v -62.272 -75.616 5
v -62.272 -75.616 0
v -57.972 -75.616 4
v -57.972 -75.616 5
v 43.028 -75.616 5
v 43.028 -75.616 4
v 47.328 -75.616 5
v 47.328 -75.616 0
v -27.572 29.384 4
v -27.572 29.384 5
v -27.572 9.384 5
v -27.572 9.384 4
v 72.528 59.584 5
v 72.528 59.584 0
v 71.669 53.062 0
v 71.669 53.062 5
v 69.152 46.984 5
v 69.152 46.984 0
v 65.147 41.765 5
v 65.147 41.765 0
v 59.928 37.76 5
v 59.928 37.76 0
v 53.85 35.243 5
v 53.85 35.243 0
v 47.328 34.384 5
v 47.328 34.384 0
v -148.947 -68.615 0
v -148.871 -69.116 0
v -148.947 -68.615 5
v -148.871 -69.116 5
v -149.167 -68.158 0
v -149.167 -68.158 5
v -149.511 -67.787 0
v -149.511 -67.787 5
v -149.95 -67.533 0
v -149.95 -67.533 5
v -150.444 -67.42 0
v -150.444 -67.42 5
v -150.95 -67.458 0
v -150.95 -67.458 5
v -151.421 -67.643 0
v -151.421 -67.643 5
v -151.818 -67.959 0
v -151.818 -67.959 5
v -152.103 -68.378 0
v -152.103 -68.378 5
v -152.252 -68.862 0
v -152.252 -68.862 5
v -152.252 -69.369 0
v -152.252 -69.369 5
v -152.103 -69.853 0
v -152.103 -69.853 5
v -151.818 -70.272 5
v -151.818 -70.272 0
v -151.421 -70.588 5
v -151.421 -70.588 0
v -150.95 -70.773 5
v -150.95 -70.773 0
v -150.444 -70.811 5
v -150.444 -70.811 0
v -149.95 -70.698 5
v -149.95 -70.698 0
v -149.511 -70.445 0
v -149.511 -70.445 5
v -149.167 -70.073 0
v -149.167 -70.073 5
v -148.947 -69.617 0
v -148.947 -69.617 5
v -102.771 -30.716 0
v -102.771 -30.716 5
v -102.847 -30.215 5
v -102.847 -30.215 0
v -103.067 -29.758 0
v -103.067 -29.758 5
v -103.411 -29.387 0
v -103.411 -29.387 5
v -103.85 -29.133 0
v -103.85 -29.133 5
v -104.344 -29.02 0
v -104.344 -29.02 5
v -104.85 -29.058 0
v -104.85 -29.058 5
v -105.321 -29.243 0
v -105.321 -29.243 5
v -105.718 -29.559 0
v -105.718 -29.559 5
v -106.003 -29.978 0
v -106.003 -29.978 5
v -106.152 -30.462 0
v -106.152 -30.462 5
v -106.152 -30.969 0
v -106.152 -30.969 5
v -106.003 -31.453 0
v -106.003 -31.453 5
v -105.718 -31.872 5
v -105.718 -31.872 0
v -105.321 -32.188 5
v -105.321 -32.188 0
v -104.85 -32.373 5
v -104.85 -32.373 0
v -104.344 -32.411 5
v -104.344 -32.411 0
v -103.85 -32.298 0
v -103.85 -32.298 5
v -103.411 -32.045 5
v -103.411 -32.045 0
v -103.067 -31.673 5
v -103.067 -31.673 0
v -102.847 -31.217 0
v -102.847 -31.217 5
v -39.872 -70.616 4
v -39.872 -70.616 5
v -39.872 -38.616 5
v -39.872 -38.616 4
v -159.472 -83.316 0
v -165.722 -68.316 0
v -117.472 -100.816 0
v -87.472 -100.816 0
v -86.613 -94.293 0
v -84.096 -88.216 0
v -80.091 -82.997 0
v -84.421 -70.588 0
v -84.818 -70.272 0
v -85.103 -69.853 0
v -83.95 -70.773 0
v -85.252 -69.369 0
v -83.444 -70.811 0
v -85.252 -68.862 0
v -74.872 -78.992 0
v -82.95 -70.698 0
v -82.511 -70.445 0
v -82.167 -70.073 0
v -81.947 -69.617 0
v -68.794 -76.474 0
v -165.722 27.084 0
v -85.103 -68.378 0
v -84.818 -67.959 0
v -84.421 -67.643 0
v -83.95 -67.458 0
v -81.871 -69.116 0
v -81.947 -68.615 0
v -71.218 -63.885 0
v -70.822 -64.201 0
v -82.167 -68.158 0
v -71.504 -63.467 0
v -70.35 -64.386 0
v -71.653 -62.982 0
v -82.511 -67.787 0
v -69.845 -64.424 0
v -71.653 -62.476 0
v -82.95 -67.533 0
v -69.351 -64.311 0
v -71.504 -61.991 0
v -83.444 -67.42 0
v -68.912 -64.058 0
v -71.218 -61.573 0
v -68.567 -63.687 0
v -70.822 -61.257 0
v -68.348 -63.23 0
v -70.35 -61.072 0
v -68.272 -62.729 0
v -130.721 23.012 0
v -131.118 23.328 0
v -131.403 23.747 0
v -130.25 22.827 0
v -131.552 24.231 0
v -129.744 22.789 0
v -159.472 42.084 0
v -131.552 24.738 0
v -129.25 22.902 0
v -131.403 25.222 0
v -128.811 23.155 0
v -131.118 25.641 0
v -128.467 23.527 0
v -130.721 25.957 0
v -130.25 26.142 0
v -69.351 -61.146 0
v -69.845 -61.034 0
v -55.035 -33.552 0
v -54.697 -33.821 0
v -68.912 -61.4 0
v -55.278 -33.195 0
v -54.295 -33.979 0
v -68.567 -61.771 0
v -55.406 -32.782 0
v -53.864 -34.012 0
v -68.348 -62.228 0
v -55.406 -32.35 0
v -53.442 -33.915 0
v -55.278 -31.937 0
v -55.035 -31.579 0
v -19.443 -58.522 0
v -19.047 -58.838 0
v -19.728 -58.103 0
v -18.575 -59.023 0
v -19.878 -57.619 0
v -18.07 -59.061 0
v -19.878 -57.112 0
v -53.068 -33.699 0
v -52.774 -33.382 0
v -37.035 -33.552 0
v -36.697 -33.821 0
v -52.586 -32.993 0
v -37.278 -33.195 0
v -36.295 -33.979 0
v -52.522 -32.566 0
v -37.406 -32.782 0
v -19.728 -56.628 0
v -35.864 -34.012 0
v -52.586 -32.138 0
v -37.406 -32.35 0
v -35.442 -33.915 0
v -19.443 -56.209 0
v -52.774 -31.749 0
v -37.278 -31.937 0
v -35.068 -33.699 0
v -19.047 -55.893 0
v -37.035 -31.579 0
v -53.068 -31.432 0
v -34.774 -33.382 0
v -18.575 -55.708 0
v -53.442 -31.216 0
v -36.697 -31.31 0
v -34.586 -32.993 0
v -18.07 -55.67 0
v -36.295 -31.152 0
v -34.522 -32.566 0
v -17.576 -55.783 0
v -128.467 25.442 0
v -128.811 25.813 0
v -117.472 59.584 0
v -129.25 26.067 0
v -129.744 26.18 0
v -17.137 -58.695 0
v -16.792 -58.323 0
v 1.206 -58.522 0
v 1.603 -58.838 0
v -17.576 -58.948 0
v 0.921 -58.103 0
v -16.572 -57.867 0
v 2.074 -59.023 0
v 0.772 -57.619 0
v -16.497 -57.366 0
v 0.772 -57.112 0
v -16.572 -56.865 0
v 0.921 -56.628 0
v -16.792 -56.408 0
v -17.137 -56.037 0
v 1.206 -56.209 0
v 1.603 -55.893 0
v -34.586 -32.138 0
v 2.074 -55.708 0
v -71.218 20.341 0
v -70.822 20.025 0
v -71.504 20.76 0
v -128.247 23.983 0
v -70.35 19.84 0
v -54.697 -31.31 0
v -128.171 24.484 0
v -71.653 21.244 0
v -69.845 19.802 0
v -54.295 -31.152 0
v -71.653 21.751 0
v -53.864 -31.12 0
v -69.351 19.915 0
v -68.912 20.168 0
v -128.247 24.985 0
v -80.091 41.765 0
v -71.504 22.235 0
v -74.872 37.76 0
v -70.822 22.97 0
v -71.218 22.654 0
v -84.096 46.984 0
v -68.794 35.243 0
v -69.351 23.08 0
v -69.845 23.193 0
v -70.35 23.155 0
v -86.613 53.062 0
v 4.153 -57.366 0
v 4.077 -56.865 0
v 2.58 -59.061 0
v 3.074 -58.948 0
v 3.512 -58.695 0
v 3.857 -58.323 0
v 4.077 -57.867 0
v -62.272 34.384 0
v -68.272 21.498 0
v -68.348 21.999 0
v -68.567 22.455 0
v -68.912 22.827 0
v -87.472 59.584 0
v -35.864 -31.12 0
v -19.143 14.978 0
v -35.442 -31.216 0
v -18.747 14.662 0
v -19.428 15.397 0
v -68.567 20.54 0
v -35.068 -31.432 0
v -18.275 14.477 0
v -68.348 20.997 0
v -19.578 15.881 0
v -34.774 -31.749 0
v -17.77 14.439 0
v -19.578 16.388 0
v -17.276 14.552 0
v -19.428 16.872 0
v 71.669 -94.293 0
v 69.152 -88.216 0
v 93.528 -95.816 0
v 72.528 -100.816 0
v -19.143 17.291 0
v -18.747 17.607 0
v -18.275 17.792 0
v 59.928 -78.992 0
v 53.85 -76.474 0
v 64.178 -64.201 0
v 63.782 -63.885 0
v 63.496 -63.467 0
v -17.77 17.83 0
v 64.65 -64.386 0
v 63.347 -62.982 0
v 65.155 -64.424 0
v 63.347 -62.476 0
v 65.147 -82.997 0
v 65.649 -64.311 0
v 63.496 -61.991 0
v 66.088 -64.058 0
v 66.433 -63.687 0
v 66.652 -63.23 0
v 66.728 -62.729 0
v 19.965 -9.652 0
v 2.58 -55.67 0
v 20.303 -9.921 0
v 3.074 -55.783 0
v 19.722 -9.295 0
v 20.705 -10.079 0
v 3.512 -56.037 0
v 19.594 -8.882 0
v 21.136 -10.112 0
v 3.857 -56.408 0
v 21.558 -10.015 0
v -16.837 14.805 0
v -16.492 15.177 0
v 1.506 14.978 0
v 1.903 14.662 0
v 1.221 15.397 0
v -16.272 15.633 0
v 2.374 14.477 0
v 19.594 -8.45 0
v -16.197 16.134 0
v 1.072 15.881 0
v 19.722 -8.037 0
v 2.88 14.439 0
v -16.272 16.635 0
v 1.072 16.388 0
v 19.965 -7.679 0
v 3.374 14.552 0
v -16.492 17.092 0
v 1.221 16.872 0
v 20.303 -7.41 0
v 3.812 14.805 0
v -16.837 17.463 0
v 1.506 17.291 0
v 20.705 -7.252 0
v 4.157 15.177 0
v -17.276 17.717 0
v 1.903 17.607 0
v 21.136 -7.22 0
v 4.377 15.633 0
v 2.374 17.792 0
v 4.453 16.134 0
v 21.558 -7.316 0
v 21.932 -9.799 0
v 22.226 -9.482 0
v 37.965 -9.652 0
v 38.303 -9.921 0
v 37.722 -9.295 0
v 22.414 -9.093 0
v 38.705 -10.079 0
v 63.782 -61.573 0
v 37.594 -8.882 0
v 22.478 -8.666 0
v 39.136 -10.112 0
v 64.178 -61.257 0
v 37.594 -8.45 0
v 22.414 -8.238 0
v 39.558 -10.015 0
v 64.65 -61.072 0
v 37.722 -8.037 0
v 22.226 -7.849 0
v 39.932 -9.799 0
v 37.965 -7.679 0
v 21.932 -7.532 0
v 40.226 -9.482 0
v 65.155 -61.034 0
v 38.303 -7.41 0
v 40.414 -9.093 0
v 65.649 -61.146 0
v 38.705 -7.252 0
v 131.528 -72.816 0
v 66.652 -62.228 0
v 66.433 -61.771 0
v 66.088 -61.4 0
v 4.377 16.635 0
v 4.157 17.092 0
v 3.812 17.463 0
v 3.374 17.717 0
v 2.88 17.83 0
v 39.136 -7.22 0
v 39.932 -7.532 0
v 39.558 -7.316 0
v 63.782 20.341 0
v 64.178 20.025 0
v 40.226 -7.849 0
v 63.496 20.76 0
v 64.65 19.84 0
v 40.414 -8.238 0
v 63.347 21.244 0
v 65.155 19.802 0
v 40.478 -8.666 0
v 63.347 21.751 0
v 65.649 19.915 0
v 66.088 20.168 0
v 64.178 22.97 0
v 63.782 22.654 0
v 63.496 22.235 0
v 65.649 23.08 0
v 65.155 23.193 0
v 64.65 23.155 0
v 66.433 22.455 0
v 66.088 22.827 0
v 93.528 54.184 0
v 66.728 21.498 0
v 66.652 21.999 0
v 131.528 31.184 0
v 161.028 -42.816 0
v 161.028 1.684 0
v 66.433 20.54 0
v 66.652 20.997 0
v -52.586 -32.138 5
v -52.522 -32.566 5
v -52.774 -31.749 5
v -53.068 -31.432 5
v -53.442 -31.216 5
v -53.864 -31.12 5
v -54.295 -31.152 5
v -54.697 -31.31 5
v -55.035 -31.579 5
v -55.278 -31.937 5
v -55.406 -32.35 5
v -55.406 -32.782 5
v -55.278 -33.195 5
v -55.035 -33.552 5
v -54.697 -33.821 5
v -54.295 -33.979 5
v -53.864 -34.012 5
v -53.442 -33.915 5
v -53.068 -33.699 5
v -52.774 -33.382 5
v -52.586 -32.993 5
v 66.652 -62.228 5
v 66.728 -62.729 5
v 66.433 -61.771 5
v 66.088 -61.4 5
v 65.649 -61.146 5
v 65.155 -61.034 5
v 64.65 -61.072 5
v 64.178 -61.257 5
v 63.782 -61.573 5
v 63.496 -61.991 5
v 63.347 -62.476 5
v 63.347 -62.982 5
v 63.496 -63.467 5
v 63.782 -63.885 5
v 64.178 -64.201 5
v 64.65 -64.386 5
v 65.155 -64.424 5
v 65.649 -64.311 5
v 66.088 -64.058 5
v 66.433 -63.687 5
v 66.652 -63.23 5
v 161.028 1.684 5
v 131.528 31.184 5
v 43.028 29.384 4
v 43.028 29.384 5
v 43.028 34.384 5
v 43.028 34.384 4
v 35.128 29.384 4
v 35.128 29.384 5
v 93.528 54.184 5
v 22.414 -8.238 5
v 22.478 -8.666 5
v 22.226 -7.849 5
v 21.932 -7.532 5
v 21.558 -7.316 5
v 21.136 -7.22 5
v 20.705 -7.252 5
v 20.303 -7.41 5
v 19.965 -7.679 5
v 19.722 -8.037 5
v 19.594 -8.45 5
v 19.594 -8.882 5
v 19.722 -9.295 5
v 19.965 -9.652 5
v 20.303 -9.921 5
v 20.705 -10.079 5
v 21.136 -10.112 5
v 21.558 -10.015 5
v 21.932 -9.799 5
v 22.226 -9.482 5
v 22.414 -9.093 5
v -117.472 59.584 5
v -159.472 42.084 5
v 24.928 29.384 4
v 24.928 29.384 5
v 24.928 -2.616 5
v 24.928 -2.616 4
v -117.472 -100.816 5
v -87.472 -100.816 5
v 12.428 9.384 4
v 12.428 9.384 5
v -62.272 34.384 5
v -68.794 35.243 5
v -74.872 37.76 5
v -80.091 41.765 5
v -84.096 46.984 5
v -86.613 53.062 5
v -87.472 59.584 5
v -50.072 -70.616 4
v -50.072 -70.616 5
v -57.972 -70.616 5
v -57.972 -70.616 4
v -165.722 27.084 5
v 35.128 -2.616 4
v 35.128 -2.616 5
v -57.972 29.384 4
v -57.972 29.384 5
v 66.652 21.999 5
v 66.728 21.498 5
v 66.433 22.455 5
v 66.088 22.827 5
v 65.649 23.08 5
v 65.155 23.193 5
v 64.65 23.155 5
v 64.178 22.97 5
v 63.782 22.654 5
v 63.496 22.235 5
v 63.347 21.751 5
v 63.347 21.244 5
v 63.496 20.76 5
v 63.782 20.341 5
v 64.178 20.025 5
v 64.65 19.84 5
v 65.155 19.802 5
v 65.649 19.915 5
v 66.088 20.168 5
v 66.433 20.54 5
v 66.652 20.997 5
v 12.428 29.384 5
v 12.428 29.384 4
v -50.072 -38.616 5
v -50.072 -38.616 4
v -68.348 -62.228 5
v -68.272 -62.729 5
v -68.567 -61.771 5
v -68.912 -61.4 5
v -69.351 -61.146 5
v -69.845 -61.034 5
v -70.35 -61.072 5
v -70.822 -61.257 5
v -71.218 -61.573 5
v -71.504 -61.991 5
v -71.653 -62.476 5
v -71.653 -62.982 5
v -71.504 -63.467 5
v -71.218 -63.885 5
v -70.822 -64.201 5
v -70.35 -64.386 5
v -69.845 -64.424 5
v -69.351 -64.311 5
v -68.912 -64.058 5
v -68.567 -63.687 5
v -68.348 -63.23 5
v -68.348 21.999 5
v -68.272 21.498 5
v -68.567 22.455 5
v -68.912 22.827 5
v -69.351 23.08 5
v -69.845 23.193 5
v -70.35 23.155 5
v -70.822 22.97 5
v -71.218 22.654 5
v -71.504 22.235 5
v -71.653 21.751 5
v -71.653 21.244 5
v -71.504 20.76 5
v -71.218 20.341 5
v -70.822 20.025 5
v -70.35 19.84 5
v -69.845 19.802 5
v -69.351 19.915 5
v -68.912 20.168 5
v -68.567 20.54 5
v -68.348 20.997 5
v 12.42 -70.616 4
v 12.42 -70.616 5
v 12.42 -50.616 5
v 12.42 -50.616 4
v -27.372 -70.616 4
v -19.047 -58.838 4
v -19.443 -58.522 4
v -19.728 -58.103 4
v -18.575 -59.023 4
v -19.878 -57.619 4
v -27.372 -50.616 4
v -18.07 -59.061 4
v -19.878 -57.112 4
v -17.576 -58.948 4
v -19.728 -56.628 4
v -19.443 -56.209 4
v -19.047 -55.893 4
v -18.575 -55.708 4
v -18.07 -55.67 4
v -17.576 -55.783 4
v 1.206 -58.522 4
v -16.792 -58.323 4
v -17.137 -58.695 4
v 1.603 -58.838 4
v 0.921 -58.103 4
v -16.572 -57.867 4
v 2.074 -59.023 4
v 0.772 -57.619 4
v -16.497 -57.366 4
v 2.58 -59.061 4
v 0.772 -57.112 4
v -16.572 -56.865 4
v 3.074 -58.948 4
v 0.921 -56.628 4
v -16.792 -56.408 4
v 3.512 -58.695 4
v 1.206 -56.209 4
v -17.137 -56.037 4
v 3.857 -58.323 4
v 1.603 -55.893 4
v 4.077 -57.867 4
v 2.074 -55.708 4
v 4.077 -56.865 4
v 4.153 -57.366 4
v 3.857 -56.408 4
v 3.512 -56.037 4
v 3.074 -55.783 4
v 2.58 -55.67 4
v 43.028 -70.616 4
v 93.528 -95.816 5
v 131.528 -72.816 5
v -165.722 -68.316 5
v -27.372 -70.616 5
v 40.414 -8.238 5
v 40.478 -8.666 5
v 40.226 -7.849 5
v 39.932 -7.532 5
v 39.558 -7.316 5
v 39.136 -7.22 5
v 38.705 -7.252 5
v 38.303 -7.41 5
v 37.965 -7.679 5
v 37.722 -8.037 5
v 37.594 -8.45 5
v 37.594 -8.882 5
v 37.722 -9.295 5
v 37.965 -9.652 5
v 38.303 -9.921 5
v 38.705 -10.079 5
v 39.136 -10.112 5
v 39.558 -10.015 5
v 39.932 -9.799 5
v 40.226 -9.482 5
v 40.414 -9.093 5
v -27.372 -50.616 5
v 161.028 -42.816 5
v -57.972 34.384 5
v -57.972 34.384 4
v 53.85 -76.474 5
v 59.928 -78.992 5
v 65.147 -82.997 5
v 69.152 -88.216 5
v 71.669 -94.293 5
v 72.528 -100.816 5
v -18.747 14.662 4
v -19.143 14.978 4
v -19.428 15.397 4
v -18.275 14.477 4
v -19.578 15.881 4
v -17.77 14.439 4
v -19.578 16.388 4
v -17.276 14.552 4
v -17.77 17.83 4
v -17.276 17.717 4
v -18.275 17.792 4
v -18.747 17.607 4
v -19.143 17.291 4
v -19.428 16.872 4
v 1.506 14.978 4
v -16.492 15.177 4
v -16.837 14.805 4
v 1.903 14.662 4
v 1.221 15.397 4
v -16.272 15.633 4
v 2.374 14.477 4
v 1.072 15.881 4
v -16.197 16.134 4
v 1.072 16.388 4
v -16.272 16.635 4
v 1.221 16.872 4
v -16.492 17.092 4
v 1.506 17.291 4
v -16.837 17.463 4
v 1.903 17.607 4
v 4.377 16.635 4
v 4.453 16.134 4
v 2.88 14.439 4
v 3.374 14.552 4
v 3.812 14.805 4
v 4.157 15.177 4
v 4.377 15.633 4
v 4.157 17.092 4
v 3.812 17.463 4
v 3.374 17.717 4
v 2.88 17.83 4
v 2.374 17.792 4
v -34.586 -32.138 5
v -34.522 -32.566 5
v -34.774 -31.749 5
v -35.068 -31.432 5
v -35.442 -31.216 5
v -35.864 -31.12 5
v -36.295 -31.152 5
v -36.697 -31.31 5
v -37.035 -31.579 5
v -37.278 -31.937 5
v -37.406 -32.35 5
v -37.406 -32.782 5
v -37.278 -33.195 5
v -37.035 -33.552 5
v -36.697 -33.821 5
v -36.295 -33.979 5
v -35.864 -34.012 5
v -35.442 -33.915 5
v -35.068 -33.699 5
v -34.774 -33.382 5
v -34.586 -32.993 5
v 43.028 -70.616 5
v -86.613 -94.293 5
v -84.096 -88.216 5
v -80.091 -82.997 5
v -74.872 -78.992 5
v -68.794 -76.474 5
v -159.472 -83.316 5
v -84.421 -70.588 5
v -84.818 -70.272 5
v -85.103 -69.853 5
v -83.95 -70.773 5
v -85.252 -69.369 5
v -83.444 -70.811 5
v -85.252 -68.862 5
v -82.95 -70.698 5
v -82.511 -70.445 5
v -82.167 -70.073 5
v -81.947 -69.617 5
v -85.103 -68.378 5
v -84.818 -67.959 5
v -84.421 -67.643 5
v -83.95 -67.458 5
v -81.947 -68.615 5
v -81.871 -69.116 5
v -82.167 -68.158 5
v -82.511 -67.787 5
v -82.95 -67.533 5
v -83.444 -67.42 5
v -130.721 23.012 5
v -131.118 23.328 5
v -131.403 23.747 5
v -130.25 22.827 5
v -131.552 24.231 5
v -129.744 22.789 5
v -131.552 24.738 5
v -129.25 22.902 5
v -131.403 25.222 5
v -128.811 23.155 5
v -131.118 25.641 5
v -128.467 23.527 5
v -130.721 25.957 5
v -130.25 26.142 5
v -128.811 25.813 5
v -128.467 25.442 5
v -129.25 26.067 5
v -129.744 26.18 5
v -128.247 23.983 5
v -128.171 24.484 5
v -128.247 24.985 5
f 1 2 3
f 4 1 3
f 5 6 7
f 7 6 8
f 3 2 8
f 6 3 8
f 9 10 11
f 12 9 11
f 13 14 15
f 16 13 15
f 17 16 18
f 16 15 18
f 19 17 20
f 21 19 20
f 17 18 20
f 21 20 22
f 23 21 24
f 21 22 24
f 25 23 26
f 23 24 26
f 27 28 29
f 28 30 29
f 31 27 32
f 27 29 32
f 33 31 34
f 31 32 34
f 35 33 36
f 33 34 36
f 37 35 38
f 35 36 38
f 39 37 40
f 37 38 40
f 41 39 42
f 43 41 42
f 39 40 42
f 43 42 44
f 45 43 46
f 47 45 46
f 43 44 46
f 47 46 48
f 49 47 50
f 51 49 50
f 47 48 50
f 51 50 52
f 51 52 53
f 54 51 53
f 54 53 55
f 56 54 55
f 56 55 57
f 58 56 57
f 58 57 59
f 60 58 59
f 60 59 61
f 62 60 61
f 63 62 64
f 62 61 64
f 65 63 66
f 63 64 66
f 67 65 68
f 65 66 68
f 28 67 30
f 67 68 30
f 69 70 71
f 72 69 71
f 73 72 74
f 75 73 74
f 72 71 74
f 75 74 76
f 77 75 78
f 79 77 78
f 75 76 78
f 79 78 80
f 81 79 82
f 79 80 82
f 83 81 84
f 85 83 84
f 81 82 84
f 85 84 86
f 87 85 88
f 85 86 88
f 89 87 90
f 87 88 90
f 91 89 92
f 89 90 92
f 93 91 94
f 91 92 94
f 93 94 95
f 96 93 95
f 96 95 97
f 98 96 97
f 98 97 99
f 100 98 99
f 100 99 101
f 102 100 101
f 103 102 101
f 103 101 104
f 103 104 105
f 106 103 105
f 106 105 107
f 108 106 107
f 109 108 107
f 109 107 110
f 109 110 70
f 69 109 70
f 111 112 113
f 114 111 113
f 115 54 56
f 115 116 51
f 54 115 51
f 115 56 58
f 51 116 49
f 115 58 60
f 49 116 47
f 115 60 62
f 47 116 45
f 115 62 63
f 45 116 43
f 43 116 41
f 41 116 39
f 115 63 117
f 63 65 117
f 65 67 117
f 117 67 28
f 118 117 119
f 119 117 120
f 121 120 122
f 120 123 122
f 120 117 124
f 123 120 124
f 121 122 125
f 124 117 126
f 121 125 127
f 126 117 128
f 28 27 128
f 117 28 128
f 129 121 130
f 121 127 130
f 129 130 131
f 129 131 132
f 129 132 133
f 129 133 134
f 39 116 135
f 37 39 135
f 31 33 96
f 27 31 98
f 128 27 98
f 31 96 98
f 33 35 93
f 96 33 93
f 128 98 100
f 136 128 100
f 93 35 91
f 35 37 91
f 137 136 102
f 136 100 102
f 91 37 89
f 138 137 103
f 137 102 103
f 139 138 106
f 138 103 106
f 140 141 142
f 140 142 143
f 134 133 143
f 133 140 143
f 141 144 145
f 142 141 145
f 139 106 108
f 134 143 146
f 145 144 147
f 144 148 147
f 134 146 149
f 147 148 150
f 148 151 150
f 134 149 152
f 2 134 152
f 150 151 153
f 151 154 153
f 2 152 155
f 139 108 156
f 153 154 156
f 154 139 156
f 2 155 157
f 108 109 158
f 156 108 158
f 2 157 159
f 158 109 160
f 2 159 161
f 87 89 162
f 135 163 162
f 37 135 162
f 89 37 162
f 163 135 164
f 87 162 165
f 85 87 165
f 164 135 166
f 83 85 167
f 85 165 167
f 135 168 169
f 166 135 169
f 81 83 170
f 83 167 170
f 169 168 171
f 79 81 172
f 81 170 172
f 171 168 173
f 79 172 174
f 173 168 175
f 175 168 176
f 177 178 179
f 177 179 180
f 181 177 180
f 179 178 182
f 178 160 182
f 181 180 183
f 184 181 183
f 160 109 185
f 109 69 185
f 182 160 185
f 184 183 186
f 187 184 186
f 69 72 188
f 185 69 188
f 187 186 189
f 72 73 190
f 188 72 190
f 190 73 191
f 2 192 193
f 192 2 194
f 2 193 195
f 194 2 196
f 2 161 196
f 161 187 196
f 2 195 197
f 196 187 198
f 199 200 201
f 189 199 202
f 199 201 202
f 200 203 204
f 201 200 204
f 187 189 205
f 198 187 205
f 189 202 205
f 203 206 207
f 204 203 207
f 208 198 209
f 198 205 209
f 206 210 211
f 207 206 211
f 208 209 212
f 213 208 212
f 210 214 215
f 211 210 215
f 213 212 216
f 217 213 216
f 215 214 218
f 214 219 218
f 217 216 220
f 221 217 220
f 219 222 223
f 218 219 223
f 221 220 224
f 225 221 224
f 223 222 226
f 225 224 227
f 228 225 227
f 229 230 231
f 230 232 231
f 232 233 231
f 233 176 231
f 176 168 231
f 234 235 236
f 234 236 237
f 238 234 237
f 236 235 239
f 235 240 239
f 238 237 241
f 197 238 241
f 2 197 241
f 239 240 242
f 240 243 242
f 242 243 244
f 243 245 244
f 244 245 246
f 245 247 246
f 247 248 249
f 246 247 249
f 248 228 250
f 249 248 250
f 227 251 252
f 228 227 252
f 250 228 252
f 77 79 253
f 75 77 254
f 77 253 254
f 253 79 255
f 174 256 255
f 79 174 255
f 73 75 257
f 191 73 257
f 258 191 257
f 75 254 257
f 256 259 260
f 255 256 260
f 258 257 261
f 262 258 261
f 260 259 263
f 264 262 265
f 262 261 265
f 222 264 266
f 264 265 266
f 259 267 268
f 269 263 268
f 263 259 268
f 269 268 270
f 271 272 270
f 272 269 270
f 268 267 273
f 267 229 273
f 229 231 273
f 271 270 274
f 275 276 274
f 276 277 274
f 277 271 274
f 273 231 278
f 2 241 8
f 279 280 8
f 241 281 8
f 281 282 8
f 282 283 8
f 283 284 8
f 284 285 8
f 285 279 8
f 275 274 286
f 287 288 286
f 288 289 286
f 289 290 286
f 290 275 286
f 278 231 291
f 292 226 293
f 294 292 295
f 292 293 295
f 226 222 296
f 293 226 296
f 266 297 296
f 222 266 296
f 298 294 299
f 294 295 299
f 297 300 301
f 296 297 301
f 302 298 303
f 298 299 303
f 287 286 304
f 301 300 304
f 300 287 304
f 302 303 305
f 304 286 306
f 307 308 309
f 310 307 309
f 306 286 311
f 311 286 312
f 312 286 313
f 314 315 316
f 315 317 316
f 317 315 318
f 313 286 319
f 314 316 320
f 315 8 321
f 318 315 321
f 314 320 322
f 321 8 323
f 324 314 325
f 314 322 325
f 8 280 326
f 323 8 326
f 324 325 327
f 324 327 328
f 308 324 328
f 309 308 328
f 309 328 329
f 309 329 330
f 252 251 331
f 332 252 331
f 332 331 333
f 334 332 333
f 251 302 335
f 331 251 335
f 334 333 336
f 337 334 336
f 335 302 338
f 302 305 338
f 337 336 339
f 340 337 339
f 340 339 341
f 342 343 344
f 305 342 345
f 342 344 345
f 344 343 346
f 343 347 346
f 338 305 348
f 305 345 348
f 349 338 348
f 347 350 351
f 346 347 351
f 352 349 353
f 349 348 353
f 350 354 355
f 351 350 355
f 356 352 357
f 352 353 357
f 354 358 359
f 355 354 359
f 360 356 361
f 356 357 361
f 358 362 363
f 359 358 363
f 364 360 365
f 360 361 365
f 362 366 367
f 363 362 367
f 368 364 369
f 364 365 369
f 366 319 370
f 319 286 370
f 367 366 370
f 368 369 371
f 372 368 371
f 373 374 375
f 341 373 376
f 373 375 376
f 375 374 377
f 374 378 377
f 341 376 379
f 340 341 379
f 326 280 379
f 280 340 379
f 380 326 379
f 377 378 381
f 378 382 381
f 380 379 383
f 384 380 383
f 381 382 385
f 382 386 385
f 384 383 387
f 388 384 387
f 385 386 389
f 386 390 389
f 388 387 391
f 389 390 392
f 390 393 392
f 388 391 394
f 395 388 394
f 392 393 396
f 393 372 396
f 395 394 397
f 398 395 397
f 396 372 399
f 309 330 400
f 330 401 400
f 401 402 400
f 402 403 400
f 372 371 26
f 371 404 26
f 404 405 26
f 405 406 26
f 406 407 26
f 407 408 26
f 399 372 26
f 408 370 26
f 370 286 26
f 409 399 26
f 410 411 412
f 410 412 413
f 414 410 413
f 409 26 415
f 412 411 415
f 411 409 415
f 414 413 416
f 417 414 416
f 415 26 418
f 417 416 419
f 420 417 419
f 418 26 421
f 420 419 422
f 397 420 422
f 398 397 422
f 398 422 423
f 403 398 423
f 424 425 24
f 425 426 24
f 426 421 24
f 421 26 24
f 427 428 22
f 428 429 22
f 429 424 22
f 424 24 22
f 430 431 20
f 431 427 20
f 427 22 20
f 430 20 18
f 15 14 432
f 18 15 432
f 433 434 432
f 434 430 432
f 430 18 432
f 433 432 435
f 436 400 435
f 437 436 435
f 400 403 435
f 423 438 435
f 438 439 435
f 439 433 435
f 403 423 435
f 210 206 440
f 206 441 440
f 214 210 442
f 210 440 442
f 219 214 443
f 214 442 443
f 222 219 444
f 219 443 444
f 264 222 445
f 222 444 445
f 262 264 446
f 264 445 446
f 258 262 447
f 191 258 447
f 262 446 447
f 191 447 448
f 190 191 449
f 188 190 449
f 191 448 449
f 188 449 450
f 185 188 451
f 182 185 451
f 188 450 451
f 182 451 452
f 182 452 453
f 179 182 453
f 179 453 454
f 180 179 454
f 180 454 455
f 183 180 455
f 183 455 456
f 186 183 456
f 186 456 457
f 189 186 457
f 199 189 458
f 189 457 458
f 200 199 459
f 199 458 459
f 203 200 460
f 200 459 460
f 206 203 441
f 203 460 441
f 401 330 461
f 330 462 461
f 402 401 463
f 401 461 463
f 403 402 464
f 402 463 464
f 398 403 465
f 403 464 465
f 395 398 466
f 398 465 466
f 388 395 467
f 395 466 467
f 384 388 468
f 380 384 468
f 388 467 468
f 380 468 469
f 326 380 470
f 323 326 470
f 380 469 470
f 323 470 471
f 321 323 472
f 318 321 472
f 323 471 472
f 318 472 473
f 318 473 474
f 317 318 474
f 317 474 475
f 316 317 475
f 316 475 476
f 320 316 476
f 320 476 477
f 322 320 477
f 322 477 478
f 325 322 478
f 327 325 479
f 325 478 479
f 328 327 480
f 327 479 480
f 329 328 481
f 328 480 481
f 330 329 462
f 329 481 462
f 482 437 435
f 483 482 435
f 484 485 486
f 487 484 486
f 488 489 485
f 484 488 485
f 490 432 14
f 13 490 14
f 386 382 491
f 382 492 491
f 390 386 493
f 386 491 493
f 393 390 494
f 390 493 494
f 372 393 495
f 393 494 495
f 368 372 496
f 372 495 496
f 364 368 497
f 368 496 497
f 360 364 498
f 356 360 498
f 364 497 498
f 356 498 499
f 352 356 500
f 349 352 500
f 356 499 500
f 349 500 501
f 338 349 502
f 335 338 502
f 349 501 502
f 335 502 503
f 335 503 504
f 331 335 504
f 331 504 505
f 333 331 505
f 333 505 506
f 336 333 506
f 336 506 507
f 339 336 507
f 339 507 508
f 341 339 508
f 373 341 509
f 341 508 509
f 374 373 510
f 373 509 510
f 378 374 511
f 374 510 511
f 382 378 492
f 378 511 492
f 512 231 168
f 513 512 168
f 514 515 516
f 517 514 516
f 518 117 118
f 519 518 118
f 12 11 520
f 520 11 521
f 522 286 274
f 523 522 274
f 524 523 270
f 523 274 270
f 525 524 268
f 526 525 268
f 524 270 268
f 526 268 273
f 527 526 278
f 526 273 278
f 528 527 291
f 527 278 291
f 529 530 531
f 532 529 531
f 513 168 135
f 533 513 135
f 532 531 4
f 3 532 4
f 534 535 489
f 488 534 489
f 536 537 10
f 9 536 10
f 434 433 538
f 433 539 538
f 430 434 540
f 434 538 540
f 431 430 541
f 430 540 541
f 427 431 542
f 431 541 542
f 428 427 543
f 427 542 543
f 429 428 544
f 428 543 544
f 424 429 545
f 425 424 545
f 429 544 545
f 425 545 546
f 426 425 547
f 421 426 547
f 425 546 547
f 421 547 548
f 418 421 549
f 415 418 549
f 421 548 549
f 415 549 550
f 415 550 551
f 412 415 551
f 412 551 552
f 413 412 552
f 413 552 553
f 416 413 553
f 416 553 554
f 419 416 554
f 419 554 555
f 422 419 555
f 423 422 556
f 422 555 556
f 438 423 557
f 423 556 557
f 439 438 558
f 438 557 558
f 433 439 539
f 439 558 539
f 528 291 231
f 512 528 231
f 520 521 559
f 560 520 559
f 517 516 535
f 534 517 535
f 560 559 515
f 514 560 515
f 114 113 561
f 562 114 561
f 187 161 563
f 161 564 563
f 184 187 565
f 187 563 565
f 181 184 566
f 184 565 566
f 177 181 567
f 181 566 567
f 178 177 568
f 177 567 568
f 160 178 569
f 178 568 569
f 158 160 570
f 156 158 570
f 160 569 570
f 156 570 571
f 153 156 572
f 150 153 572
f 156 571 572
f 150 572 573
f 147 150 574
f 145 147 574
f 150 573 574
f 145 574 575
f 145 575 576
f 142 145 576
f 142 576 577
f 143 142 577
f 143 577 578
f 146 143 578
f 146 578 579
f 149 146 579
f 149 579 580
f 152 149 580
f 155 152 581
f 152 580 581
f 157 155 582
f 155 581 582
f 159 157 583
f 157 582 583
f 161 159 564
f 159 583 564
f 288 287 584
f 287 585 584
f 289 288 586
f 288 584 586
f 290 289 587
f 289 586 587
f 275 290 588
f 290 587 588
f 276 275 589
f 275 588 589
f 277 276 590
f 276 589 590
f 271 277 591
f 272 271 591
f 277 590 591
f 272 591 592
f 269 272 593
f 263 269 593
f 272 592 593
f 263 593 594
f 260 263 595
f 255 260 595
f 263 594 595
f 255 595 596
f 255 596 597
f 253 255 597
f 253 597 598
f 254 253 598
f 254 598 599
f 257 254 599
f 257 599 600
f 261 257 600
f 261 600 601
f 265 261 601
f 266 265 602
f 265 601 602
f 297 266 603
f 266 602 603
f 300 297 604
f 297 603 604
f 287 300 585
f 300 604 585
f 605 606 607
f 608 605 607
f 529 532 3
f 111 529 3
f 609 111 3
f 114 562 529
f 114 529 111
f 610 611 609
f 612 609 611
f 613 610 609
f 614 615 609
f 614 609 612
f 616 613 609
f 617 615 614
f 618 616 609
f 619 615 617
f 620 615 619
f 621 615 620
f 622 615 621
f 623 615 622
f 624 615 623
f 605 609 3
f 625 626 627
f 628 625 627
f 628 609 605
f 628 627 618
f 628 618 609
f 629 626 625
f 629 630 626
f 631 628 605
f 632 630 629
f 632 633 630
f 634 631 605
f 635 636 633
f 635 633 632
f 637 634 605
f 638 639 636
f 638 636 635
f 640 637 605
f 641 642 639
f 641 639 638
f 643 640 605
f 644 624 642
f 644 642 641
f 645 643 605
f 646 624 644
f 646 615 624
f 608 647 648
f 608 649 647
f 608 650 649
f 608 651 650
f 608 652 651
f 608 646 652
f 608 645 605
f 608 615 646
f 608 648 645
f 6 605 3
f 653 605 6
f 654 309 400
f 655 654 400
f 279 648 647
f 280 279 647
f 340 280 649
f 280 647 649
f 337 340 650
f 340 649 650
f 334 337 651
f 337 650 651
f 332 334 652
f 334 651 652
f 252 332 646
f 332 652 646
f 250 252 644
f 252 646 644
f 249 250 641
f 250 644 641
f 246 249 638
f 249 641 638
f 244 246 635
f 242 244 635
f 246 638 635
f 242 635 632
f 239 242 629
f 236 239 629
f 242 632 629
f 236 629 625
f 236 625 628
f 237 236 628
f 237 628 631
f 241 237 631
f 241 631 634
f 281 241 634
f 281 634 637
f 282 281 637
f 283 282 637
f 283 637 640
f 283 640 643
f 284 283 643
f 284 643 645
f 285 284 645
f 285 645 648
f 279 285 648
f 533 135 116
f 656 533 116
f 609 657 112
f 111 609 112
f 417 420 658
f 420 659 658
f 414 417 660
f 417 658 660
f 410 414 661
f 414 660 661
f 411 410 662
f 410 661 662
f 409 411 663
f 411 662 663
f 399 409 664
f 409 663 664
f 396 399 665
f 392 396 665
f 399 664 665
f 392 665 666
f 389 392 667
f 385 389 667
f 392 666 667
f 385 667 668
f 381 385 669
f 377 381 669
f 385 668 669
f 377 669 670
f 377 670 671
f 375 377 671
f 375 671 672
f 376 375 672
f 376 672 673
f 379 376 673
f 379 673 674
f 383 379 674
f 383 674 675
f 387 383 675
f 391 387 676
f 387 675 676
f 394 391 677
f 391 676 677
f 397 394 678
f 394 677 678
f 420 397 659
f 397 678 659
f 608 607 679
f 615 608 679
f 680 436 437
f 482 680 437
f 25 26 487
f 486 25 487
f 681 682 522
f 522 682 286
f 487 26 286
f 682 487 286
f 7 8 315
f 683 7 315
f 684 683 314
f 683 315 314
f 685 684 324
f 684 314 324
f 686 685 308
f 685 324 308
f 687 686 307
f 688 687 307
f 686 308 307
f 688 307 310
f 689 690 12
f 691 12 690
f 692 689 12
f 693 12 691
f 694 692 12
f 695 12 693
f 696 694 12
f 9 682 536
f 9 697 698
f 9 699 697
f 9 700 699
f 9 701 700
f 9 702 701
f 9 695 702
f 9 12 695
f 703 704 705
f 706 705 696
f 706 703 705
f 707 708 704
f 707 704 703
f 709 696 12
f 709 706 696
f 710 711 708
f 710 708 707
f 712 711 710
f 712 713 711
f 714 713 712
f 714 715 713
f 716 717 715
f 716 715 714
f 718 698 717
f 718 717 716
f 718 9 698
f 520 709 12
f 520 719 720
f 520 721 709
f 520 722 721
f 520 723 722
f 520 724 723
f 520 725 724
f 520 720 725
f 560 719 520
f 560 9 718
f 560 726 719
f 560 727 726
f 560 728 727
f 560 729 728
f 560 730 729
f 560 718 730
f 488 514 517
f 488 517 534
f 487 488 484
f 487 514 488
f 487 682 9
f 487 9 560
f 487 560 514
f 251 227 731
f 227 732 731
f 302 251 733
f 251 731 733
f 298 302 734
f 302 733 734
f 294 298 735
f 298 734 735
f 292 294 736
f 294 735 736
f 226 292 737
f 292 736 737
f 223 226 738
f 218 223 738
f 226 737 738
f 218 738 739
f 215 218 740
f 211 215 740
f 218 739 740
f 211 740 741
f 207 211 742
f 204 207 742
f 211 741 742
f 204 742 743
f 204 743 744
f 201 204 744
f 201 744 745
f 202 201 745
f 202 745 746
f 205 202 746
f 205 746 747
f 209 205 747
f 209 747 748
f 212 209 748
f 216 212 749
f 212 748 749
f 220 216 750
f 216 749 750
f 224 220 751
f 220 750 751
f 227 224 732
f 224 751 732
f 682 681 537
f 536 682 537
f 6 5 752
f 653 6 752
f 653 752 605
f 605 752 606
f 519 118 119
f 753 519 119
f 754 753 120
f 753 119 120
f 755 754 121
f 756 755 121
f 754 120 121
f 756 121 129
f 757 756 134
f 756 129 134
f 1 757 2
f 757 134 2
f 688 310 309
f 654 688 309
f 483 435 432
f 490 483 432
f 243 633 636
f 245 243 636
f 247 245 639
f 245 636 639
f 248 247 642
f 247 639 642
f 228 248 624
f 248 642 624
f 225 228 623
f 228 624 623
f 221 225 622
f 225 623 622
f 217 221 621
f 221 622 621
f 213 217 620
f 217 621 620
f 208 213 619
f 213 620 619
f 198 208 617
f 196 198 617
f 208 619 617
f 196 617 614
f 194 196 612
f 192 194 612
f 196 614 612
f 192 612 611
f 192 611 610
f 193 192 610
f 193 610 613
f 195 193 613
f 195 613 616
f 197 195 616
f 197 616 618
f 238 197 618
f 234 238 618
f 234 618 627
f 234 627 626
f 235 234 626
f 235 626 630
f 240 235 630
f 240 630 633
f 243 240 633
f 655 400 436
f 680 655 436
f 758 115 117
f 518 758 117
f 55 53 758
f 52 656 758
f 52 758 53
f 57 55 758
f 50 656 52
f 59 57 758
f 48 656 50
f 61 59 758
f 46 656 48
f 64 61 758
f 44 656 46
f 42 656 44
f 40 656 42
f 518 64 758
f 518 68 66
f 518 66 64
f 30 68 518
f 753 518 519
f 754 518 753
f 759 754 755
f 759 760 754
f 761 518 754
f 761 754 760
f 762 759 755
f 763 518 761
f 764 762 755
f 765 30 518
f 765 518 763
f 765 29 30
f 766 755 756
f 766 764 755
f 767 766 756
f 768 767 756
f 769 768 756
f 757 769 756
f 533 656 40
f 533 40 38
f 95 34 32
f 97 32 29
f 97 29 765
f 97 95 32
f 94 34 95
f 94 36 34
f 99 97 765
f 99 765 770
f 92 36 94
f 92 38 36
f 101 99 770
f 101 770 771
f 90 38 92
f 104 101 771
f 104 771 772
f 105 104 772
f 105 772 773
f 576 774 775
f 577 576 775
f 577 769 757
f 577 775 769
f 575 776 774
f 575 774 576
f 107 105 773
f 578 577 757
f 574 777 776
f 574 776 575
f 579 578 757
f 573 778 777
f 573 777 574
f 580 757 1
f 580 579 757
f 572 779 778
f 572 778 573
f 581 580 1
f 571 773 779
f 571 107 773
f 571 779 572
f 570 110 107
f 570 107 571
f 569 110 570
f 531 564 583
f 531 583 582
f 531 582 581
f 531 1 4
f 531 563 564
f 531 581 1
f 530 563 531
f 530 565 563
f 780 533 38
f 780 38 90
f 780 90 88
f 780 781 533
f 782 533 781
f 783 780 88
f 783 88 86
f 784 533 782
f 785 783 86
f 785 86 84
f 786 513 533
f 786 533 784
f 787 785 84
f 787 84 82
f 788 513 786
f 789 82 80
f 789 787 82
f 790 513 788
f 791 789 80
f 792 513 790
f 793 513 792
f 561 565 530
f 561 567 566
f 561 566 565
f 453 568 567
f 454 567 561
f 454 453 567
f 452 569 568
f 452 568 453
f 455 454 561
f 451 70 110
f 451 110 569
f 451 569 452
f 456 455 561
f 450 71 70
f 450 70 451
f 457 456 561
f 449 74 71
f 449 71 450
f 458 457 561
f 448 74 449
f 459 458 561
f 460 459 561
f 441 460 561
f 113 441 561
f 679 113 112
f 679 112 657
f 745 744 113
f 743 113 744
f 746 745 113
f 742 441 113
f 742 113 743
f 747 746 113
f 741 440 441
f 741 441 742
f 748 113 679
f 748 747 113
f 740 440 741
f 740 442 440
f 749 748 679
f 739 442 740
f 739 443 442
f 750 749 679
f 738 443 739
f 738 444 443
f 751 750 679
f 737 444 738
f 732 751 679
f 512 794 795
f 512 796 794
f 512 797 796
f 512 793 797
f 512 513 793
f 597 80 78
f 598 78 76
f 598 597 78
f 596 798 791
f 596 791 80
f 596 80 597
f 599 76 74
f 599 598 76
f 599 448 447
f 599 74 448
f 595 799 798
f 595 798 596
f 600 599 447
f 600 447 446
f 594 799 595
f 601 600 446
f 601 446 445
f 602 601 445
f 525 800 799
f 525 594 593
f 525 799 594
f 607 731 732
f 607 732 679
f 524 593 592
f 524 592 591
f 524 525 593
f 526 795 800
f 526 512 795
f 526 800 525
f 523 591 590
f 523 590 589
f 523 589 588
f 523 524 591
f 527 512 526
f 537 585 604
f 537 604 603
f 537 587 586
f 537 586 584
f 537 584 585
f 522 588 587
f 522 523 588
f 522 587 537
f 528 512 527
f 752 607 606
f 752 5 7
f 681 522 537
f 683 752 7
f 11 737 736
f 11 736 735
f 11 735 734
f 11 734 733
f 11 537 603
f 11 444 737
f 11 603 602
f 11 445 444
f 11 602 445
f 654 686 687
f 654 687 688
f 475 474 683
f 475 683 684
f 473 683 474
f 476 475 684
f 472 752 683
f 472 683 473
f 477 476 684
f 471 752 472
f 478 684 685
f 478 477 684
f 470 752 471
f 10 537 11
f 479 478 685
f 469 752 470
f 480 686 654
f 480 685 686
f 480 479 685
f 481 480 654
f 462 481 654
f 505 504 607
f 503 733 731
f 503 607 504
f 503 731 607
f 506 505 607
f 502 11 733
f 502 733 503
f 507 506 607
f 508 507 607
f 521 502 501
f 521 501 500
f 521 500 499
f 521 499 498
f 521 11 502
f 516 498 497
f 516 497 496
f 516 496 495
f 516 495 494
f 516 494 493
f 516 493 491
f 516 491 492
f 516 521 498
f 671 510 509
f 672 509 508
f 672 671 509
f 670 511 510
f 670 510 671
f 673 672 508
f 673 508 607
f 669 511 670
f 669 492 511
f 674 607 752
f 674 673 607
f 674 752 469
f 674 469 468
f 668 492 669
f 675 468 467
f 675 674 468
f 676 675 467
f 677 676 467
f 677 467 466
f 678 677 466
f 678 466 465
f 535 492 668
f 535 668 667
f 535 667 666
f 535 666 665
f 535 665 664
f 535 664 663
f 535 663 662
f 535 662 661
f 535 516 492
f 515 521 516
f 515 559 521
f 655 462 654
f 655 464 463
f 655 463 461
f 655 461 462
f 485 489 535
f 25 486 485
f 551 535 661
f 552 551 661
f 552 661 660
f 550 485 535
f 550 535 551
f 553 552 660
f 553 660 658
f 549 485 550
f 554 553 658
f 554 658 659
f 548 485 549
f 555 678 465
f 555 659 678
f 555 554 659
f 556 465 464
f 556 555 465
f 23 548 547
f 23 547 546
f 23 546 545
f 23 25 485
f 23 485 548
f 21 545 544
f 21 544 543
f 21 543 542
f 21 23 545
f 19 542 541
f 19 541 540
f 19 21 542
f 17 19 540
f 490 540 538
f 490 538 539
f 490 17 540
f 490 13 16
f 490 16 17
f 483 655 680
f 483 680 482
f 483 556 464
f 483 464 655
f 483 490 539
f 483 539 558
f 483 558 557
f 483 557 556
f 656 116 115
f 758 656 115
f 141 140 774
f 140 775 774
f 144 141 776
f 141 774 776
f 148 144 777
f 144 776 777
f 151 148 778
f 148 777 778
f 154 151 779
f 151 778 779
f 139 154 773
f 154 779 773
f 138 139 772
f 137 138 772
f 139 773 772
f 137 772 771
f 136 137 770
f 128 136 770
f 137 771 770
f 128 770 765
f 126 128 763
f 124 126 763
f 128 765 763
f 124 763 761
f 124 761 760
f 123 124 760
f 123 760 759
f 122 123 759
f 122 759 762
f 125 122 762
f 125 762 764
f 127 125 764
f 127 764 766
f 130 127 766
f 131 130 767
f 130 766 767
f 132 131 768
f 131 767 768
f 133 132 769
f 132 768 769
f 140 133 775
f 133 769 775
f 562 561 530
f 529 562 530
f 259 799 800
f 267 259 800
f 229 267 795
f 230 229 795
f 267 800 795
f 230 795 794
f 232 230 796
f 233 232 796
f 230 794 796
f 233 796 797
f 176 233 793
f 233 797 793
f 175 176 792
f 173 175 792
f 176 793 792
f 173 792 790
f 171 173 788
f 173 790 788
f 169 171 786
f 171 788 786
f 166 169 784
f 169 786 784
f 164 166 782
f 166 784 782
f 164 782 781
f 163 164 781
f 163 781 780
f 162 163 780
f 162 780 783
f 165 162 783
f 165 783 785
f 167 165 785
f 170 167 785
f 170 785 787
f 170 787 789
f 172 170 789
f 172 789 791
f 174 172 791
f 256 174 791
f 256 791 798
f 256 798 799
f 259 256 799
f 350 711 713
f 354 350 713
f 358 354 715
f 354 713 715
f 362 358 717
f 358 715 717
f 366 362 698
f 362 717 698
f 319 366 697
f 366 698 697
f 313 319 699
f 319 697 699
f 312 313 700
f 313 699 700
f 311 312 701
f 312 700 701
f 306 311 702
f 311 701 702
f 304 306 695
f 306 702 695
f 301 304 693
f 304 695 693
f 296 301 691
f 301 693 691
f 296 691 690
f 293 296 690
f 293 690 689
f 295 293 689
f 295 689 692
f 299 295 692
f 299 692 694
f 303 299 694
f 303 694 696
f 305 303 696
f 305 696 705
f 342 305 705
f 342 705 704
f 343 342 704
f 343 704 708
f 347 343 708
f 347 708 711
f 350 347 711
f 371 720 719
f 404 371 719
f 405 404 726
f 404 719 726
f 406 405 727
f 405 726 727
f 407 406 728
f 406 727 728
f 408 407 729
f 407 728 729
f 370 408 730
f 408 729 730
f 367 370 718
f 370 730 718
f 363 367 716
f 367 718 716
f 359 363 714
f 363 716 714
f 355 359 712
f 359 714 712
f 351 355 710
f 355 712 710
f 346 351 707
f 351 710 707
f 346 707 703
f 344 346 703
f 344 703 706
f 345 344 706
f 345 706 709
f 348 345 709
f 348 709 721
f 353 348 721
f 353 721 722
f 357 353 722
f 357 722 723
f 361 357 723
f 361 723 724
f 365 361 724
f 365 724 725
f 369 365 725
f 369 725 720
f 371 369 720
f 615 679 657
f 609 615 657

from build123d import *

# Parameters (mm, degrees)
BOSS_EXTRU_1_DEPTH      = 5
D_GAGEMENT_M2_51_D      = 2.9
D_GAGEMENT_M2_51_DEPTH  = 5
D_GAGEMENT_M2_51_TIP    = 0.871247898
D_GAGEMENT_M31_D        = 3.4
D_GAGEMENT_M31_DEPTH    = 6
D_GAGEMENT_M31_TIP      = 1.021463052
D_GAGEMENT_M32_D        = 3.4
D_GAGEMENT_M32_DEPTH    = 5
D_GAGEMENT_M32_TIP      = 1.021463052
ENL_V_MAT_EXTRU_1_DEPTH = 1
ENL_V_MAT_EXTRU_2_DEPTH = 1
D_GAGEMENT_M33_D        = 3.4
D_GAGEMENT_M33_DEPTH    = 6
D_GAGEMENT_M33_TIP      = 1.021463052
D_GAGEMENT_M34_D        = 3.4
D_GAGEMENT_M34_DEPTH    = 5
D_GAGEMENT_M34_TIP      = 1.021463052


with BuildPart() as part:
    # Esquisse1 → Boss.-Extru.1 (new body)
    with BuildSketch(Plane.XY):
        with BuildLine():
            Line((-87.472008168, 59.584338106), (-117.472008168, 59.584338106))
            Line((-117.472008168, 59.584338106), (-159.472008168, 42.084338106))
            Line((-159.472008168, 42.084338106), (-165.722008168, 27.084338106))
            Line((-165.722008168, 27.084338106), (-165.722008168, -68.315661894))
            Line((-165.722008168, -68.315661894), (-159.472008168, -83.315661894))
            Line((-159.472008168, -83.315661894), (-117.472008168, -100.815661894))
            Line((-117.472008168, -100.815661894), (-87.472008168, -100.815661894))
            ThreePointArc((-87.472008168, -100.815661894), (-80.091099054, -82.996571008), (-62.272008168, -75.615661894))
            Line((-62.272008168, -75.615661894), (47.327991832, -75.615661894))
            ThreePointArc((47.327991832, -75.615661894), (65.147082718, -82.996571008), (72.527991832, -100.815661894))
            Line((72.527991832, -100.815661894), (93.527991832, -95.815661894))
            Line((93.527991832, -95.815661894), (131.527991832, -72.815661894))
            Line((131.527991832, -72.815661894), (161.027991832, -42.815661894))
            Line((161.027991832, -42.815661894), (161.027991832, 1.684338106))
            Line((161.027991832, 1.684338106), (131.527991832, 31.184338106))
            Line((131.527991832, 31.184338106), (93.527991832, 54.184338106))
            Line((93.527991832, 54.184338106), (72.527991832, 59.584338106))
            ThreePointArc((72.527991832, 59.584338106), (65.147082718, 41.76524722), (47.327991832, 34.384338106))
            Line((47.327991832, 34.384338106), (-62.272008168, 34.384338106))
            ThreePointArc((-62.272008168, 34.384338106), (-80.091099054, 41.76524722), (-87.472008168, 59.584338106))
        make_face()
    extrude(amount=BOSS_EXTRU_1_DEPTH)

    # Dégagement M2.51
    with Locations(Plane(origin=(0, 0, 0), x_dir=(-1, 0, 0), z_dir=(0, 0, -1))):
        with Locations((-21.027991832, -8.66564946), (-39.027991832, -8.66564946), (35.972008168, -32.565674331), (53.972008168, -32.565674331)):
            Hole(D_GAGEMENT_M2_51_D / 2, depth=D_GAGEMENT_M2_51_DEPTH)
            with Locations((0, 0, -(D_GAGEMENT_M2_51_DEPTH + D_GAGEMENT_M2_51_TIP / 2))):  # 118° drill point
                Cone(0, D_GAGEMENT_M2_51_D / 2, D_GAGEMENT_M2_51_TIP, mode=Mode.SUBTRACT)

    # Dégagement M31
    with Locations(Plane(origin=(0, 0, 0), x_dir=(-1, 0, 0), z_dir=(0, 0, -1))):
        with Locations((17.896581687, 16.134338106), (-2.752565352, 16.134338106), (18.196581687, -57.365661894), (-2.452565352, -57.365661894)):
            Hole(D_GAGEMENT_M31_D / 2, depth=D_GAGEMENT_M31_DEPTH)
            with Locations((0, 0, -(D_GAGEMENT_M31_DEPTH + D_GAGEMENT_M31_TIP / 2))):  # 118° drill point
                Cone(0, D_GAGEMENT_M31_D / 2, D_GAGEMENT_M31_TIP, mode=Mode.SUBTRACT)

    # Dégagement M32
    with Locations(Plane(origin=(0, 0, 0), x_dir=(-1, 0, 0), z_dir=(0, 0, -1))):
        with Locations((69.972008168, -62.728910548), (69.972008168, 21.49758676), (-65.027991832, -62.728910548), (-65.027991832, 21.49758676)):
            Hole(D_GAGEMENT_M32_D / 2, depth=D_GAGEMENT_M32_DEPTH)
            with Locations((0, 0, -(D_GAGEMENT_M32_DEPTH + D_GAGEMENT_M32_TIP / 2))):  # 118° drill point
                Cone(0, D_GAGEMENT_M32_D / 2, D_GAGEMENT_M32_TIP, mode=Mode.SUBTRACT)

    # Esquisse10 → Enlèv. mat.-Extru.1 (cut)
    with BuildSketch(Plane.XY.offset(5)):
        Polygon((43.027991832, -75.615661894), (43.027991832, -70.615661894), (12.42027445, -70.615661894), (12.42027445, -50.615661894), (-27.372008168, -50.615661894), (-27.372008168, -70.615661894), (-36.072008168, -70.615661894), (-39.872008168, -70.615661894), (-39.872008168, -38.615661894), (-50.072008168, -38.615661894), (-50.072008168, -70.615661894), (-57.972008168, -70.615661894), (-57.972008168, -75.615661894), align=None)
    extrude(amount=-ENL_V_MAT_EXTRU_1_DEPTH, mode=Mode.SUBTRACT)

    # Esquisse10<3> → Enlèv. mat.-Extru.2 (cut)
    with BuildSketch(Plane.XY.offset(5)):
        Polygon((43.027991832, 29.384338106), (43.027991832, 34.384338106), (-57.972008168, 34.384338106), (-57.972008168, 29.384338106), (-27.572008168, 29.384338106), (-27.572008168, 9.384338106), (12.427991832, 9.384338106), (12.427991832, 29.384338106), (24.927991832, 29.384338106), (24.927991832, -2.615661894), (35.127991832, -2.615661894), (35.127991832, 29.384338106), align=None)
    extrude(amount=-ENL_V_MAT_EXTRU_2_DEPTH, mode=Mode.SUBTRACT)

    # Dégagement M33
    with Locations(Plane(origin=(0, 0, 0), x_dir=(-1, 0, 0), z_dir=(0, 0, -1))):
        with Locations((104.471408589, -30.715661894), (129.871408589, 24.484338106)):
            Hole(D_GAGEMENT_M33_D / 2, depth=D_GAGEMENT_M33_DEPTH)
            with Locations((0, 0, -(D_GAGEMENT_M33_DEPTH + D_GAGEMENT_M33_TIP / 2))):  # 118° drill point
                Cone(0, D_GAGEMENT_M33_D / 2, D_GAGEMENT_M33_TIP, mode=Mode.SUBTRACT)

    # Dégagement M34
    with Locations(Plane(origin=(0, 0, 0), x_dir=(-1, 0, 0), z_dir=(0, 0, -1))):
        with Locations((150.571408589, -69.115661894), (83.571408589, -69.115661894)):
            Hole(D_GAGEMENT_M34_D / 2, depth=D_GAGEMENT_M34_DEPTH)
            with Locations((0, 0, -(D_GAGEMENT_M34_DEPTH + D_GAGEMENT_M34_TIP / 2))):  # 118° drill point
                Cone(0, D_GAGEMENT_M34_D / 2, D_GAGEMENT_M34_TIP, mode=Mode.SUBTRACT)


solid = part.part
